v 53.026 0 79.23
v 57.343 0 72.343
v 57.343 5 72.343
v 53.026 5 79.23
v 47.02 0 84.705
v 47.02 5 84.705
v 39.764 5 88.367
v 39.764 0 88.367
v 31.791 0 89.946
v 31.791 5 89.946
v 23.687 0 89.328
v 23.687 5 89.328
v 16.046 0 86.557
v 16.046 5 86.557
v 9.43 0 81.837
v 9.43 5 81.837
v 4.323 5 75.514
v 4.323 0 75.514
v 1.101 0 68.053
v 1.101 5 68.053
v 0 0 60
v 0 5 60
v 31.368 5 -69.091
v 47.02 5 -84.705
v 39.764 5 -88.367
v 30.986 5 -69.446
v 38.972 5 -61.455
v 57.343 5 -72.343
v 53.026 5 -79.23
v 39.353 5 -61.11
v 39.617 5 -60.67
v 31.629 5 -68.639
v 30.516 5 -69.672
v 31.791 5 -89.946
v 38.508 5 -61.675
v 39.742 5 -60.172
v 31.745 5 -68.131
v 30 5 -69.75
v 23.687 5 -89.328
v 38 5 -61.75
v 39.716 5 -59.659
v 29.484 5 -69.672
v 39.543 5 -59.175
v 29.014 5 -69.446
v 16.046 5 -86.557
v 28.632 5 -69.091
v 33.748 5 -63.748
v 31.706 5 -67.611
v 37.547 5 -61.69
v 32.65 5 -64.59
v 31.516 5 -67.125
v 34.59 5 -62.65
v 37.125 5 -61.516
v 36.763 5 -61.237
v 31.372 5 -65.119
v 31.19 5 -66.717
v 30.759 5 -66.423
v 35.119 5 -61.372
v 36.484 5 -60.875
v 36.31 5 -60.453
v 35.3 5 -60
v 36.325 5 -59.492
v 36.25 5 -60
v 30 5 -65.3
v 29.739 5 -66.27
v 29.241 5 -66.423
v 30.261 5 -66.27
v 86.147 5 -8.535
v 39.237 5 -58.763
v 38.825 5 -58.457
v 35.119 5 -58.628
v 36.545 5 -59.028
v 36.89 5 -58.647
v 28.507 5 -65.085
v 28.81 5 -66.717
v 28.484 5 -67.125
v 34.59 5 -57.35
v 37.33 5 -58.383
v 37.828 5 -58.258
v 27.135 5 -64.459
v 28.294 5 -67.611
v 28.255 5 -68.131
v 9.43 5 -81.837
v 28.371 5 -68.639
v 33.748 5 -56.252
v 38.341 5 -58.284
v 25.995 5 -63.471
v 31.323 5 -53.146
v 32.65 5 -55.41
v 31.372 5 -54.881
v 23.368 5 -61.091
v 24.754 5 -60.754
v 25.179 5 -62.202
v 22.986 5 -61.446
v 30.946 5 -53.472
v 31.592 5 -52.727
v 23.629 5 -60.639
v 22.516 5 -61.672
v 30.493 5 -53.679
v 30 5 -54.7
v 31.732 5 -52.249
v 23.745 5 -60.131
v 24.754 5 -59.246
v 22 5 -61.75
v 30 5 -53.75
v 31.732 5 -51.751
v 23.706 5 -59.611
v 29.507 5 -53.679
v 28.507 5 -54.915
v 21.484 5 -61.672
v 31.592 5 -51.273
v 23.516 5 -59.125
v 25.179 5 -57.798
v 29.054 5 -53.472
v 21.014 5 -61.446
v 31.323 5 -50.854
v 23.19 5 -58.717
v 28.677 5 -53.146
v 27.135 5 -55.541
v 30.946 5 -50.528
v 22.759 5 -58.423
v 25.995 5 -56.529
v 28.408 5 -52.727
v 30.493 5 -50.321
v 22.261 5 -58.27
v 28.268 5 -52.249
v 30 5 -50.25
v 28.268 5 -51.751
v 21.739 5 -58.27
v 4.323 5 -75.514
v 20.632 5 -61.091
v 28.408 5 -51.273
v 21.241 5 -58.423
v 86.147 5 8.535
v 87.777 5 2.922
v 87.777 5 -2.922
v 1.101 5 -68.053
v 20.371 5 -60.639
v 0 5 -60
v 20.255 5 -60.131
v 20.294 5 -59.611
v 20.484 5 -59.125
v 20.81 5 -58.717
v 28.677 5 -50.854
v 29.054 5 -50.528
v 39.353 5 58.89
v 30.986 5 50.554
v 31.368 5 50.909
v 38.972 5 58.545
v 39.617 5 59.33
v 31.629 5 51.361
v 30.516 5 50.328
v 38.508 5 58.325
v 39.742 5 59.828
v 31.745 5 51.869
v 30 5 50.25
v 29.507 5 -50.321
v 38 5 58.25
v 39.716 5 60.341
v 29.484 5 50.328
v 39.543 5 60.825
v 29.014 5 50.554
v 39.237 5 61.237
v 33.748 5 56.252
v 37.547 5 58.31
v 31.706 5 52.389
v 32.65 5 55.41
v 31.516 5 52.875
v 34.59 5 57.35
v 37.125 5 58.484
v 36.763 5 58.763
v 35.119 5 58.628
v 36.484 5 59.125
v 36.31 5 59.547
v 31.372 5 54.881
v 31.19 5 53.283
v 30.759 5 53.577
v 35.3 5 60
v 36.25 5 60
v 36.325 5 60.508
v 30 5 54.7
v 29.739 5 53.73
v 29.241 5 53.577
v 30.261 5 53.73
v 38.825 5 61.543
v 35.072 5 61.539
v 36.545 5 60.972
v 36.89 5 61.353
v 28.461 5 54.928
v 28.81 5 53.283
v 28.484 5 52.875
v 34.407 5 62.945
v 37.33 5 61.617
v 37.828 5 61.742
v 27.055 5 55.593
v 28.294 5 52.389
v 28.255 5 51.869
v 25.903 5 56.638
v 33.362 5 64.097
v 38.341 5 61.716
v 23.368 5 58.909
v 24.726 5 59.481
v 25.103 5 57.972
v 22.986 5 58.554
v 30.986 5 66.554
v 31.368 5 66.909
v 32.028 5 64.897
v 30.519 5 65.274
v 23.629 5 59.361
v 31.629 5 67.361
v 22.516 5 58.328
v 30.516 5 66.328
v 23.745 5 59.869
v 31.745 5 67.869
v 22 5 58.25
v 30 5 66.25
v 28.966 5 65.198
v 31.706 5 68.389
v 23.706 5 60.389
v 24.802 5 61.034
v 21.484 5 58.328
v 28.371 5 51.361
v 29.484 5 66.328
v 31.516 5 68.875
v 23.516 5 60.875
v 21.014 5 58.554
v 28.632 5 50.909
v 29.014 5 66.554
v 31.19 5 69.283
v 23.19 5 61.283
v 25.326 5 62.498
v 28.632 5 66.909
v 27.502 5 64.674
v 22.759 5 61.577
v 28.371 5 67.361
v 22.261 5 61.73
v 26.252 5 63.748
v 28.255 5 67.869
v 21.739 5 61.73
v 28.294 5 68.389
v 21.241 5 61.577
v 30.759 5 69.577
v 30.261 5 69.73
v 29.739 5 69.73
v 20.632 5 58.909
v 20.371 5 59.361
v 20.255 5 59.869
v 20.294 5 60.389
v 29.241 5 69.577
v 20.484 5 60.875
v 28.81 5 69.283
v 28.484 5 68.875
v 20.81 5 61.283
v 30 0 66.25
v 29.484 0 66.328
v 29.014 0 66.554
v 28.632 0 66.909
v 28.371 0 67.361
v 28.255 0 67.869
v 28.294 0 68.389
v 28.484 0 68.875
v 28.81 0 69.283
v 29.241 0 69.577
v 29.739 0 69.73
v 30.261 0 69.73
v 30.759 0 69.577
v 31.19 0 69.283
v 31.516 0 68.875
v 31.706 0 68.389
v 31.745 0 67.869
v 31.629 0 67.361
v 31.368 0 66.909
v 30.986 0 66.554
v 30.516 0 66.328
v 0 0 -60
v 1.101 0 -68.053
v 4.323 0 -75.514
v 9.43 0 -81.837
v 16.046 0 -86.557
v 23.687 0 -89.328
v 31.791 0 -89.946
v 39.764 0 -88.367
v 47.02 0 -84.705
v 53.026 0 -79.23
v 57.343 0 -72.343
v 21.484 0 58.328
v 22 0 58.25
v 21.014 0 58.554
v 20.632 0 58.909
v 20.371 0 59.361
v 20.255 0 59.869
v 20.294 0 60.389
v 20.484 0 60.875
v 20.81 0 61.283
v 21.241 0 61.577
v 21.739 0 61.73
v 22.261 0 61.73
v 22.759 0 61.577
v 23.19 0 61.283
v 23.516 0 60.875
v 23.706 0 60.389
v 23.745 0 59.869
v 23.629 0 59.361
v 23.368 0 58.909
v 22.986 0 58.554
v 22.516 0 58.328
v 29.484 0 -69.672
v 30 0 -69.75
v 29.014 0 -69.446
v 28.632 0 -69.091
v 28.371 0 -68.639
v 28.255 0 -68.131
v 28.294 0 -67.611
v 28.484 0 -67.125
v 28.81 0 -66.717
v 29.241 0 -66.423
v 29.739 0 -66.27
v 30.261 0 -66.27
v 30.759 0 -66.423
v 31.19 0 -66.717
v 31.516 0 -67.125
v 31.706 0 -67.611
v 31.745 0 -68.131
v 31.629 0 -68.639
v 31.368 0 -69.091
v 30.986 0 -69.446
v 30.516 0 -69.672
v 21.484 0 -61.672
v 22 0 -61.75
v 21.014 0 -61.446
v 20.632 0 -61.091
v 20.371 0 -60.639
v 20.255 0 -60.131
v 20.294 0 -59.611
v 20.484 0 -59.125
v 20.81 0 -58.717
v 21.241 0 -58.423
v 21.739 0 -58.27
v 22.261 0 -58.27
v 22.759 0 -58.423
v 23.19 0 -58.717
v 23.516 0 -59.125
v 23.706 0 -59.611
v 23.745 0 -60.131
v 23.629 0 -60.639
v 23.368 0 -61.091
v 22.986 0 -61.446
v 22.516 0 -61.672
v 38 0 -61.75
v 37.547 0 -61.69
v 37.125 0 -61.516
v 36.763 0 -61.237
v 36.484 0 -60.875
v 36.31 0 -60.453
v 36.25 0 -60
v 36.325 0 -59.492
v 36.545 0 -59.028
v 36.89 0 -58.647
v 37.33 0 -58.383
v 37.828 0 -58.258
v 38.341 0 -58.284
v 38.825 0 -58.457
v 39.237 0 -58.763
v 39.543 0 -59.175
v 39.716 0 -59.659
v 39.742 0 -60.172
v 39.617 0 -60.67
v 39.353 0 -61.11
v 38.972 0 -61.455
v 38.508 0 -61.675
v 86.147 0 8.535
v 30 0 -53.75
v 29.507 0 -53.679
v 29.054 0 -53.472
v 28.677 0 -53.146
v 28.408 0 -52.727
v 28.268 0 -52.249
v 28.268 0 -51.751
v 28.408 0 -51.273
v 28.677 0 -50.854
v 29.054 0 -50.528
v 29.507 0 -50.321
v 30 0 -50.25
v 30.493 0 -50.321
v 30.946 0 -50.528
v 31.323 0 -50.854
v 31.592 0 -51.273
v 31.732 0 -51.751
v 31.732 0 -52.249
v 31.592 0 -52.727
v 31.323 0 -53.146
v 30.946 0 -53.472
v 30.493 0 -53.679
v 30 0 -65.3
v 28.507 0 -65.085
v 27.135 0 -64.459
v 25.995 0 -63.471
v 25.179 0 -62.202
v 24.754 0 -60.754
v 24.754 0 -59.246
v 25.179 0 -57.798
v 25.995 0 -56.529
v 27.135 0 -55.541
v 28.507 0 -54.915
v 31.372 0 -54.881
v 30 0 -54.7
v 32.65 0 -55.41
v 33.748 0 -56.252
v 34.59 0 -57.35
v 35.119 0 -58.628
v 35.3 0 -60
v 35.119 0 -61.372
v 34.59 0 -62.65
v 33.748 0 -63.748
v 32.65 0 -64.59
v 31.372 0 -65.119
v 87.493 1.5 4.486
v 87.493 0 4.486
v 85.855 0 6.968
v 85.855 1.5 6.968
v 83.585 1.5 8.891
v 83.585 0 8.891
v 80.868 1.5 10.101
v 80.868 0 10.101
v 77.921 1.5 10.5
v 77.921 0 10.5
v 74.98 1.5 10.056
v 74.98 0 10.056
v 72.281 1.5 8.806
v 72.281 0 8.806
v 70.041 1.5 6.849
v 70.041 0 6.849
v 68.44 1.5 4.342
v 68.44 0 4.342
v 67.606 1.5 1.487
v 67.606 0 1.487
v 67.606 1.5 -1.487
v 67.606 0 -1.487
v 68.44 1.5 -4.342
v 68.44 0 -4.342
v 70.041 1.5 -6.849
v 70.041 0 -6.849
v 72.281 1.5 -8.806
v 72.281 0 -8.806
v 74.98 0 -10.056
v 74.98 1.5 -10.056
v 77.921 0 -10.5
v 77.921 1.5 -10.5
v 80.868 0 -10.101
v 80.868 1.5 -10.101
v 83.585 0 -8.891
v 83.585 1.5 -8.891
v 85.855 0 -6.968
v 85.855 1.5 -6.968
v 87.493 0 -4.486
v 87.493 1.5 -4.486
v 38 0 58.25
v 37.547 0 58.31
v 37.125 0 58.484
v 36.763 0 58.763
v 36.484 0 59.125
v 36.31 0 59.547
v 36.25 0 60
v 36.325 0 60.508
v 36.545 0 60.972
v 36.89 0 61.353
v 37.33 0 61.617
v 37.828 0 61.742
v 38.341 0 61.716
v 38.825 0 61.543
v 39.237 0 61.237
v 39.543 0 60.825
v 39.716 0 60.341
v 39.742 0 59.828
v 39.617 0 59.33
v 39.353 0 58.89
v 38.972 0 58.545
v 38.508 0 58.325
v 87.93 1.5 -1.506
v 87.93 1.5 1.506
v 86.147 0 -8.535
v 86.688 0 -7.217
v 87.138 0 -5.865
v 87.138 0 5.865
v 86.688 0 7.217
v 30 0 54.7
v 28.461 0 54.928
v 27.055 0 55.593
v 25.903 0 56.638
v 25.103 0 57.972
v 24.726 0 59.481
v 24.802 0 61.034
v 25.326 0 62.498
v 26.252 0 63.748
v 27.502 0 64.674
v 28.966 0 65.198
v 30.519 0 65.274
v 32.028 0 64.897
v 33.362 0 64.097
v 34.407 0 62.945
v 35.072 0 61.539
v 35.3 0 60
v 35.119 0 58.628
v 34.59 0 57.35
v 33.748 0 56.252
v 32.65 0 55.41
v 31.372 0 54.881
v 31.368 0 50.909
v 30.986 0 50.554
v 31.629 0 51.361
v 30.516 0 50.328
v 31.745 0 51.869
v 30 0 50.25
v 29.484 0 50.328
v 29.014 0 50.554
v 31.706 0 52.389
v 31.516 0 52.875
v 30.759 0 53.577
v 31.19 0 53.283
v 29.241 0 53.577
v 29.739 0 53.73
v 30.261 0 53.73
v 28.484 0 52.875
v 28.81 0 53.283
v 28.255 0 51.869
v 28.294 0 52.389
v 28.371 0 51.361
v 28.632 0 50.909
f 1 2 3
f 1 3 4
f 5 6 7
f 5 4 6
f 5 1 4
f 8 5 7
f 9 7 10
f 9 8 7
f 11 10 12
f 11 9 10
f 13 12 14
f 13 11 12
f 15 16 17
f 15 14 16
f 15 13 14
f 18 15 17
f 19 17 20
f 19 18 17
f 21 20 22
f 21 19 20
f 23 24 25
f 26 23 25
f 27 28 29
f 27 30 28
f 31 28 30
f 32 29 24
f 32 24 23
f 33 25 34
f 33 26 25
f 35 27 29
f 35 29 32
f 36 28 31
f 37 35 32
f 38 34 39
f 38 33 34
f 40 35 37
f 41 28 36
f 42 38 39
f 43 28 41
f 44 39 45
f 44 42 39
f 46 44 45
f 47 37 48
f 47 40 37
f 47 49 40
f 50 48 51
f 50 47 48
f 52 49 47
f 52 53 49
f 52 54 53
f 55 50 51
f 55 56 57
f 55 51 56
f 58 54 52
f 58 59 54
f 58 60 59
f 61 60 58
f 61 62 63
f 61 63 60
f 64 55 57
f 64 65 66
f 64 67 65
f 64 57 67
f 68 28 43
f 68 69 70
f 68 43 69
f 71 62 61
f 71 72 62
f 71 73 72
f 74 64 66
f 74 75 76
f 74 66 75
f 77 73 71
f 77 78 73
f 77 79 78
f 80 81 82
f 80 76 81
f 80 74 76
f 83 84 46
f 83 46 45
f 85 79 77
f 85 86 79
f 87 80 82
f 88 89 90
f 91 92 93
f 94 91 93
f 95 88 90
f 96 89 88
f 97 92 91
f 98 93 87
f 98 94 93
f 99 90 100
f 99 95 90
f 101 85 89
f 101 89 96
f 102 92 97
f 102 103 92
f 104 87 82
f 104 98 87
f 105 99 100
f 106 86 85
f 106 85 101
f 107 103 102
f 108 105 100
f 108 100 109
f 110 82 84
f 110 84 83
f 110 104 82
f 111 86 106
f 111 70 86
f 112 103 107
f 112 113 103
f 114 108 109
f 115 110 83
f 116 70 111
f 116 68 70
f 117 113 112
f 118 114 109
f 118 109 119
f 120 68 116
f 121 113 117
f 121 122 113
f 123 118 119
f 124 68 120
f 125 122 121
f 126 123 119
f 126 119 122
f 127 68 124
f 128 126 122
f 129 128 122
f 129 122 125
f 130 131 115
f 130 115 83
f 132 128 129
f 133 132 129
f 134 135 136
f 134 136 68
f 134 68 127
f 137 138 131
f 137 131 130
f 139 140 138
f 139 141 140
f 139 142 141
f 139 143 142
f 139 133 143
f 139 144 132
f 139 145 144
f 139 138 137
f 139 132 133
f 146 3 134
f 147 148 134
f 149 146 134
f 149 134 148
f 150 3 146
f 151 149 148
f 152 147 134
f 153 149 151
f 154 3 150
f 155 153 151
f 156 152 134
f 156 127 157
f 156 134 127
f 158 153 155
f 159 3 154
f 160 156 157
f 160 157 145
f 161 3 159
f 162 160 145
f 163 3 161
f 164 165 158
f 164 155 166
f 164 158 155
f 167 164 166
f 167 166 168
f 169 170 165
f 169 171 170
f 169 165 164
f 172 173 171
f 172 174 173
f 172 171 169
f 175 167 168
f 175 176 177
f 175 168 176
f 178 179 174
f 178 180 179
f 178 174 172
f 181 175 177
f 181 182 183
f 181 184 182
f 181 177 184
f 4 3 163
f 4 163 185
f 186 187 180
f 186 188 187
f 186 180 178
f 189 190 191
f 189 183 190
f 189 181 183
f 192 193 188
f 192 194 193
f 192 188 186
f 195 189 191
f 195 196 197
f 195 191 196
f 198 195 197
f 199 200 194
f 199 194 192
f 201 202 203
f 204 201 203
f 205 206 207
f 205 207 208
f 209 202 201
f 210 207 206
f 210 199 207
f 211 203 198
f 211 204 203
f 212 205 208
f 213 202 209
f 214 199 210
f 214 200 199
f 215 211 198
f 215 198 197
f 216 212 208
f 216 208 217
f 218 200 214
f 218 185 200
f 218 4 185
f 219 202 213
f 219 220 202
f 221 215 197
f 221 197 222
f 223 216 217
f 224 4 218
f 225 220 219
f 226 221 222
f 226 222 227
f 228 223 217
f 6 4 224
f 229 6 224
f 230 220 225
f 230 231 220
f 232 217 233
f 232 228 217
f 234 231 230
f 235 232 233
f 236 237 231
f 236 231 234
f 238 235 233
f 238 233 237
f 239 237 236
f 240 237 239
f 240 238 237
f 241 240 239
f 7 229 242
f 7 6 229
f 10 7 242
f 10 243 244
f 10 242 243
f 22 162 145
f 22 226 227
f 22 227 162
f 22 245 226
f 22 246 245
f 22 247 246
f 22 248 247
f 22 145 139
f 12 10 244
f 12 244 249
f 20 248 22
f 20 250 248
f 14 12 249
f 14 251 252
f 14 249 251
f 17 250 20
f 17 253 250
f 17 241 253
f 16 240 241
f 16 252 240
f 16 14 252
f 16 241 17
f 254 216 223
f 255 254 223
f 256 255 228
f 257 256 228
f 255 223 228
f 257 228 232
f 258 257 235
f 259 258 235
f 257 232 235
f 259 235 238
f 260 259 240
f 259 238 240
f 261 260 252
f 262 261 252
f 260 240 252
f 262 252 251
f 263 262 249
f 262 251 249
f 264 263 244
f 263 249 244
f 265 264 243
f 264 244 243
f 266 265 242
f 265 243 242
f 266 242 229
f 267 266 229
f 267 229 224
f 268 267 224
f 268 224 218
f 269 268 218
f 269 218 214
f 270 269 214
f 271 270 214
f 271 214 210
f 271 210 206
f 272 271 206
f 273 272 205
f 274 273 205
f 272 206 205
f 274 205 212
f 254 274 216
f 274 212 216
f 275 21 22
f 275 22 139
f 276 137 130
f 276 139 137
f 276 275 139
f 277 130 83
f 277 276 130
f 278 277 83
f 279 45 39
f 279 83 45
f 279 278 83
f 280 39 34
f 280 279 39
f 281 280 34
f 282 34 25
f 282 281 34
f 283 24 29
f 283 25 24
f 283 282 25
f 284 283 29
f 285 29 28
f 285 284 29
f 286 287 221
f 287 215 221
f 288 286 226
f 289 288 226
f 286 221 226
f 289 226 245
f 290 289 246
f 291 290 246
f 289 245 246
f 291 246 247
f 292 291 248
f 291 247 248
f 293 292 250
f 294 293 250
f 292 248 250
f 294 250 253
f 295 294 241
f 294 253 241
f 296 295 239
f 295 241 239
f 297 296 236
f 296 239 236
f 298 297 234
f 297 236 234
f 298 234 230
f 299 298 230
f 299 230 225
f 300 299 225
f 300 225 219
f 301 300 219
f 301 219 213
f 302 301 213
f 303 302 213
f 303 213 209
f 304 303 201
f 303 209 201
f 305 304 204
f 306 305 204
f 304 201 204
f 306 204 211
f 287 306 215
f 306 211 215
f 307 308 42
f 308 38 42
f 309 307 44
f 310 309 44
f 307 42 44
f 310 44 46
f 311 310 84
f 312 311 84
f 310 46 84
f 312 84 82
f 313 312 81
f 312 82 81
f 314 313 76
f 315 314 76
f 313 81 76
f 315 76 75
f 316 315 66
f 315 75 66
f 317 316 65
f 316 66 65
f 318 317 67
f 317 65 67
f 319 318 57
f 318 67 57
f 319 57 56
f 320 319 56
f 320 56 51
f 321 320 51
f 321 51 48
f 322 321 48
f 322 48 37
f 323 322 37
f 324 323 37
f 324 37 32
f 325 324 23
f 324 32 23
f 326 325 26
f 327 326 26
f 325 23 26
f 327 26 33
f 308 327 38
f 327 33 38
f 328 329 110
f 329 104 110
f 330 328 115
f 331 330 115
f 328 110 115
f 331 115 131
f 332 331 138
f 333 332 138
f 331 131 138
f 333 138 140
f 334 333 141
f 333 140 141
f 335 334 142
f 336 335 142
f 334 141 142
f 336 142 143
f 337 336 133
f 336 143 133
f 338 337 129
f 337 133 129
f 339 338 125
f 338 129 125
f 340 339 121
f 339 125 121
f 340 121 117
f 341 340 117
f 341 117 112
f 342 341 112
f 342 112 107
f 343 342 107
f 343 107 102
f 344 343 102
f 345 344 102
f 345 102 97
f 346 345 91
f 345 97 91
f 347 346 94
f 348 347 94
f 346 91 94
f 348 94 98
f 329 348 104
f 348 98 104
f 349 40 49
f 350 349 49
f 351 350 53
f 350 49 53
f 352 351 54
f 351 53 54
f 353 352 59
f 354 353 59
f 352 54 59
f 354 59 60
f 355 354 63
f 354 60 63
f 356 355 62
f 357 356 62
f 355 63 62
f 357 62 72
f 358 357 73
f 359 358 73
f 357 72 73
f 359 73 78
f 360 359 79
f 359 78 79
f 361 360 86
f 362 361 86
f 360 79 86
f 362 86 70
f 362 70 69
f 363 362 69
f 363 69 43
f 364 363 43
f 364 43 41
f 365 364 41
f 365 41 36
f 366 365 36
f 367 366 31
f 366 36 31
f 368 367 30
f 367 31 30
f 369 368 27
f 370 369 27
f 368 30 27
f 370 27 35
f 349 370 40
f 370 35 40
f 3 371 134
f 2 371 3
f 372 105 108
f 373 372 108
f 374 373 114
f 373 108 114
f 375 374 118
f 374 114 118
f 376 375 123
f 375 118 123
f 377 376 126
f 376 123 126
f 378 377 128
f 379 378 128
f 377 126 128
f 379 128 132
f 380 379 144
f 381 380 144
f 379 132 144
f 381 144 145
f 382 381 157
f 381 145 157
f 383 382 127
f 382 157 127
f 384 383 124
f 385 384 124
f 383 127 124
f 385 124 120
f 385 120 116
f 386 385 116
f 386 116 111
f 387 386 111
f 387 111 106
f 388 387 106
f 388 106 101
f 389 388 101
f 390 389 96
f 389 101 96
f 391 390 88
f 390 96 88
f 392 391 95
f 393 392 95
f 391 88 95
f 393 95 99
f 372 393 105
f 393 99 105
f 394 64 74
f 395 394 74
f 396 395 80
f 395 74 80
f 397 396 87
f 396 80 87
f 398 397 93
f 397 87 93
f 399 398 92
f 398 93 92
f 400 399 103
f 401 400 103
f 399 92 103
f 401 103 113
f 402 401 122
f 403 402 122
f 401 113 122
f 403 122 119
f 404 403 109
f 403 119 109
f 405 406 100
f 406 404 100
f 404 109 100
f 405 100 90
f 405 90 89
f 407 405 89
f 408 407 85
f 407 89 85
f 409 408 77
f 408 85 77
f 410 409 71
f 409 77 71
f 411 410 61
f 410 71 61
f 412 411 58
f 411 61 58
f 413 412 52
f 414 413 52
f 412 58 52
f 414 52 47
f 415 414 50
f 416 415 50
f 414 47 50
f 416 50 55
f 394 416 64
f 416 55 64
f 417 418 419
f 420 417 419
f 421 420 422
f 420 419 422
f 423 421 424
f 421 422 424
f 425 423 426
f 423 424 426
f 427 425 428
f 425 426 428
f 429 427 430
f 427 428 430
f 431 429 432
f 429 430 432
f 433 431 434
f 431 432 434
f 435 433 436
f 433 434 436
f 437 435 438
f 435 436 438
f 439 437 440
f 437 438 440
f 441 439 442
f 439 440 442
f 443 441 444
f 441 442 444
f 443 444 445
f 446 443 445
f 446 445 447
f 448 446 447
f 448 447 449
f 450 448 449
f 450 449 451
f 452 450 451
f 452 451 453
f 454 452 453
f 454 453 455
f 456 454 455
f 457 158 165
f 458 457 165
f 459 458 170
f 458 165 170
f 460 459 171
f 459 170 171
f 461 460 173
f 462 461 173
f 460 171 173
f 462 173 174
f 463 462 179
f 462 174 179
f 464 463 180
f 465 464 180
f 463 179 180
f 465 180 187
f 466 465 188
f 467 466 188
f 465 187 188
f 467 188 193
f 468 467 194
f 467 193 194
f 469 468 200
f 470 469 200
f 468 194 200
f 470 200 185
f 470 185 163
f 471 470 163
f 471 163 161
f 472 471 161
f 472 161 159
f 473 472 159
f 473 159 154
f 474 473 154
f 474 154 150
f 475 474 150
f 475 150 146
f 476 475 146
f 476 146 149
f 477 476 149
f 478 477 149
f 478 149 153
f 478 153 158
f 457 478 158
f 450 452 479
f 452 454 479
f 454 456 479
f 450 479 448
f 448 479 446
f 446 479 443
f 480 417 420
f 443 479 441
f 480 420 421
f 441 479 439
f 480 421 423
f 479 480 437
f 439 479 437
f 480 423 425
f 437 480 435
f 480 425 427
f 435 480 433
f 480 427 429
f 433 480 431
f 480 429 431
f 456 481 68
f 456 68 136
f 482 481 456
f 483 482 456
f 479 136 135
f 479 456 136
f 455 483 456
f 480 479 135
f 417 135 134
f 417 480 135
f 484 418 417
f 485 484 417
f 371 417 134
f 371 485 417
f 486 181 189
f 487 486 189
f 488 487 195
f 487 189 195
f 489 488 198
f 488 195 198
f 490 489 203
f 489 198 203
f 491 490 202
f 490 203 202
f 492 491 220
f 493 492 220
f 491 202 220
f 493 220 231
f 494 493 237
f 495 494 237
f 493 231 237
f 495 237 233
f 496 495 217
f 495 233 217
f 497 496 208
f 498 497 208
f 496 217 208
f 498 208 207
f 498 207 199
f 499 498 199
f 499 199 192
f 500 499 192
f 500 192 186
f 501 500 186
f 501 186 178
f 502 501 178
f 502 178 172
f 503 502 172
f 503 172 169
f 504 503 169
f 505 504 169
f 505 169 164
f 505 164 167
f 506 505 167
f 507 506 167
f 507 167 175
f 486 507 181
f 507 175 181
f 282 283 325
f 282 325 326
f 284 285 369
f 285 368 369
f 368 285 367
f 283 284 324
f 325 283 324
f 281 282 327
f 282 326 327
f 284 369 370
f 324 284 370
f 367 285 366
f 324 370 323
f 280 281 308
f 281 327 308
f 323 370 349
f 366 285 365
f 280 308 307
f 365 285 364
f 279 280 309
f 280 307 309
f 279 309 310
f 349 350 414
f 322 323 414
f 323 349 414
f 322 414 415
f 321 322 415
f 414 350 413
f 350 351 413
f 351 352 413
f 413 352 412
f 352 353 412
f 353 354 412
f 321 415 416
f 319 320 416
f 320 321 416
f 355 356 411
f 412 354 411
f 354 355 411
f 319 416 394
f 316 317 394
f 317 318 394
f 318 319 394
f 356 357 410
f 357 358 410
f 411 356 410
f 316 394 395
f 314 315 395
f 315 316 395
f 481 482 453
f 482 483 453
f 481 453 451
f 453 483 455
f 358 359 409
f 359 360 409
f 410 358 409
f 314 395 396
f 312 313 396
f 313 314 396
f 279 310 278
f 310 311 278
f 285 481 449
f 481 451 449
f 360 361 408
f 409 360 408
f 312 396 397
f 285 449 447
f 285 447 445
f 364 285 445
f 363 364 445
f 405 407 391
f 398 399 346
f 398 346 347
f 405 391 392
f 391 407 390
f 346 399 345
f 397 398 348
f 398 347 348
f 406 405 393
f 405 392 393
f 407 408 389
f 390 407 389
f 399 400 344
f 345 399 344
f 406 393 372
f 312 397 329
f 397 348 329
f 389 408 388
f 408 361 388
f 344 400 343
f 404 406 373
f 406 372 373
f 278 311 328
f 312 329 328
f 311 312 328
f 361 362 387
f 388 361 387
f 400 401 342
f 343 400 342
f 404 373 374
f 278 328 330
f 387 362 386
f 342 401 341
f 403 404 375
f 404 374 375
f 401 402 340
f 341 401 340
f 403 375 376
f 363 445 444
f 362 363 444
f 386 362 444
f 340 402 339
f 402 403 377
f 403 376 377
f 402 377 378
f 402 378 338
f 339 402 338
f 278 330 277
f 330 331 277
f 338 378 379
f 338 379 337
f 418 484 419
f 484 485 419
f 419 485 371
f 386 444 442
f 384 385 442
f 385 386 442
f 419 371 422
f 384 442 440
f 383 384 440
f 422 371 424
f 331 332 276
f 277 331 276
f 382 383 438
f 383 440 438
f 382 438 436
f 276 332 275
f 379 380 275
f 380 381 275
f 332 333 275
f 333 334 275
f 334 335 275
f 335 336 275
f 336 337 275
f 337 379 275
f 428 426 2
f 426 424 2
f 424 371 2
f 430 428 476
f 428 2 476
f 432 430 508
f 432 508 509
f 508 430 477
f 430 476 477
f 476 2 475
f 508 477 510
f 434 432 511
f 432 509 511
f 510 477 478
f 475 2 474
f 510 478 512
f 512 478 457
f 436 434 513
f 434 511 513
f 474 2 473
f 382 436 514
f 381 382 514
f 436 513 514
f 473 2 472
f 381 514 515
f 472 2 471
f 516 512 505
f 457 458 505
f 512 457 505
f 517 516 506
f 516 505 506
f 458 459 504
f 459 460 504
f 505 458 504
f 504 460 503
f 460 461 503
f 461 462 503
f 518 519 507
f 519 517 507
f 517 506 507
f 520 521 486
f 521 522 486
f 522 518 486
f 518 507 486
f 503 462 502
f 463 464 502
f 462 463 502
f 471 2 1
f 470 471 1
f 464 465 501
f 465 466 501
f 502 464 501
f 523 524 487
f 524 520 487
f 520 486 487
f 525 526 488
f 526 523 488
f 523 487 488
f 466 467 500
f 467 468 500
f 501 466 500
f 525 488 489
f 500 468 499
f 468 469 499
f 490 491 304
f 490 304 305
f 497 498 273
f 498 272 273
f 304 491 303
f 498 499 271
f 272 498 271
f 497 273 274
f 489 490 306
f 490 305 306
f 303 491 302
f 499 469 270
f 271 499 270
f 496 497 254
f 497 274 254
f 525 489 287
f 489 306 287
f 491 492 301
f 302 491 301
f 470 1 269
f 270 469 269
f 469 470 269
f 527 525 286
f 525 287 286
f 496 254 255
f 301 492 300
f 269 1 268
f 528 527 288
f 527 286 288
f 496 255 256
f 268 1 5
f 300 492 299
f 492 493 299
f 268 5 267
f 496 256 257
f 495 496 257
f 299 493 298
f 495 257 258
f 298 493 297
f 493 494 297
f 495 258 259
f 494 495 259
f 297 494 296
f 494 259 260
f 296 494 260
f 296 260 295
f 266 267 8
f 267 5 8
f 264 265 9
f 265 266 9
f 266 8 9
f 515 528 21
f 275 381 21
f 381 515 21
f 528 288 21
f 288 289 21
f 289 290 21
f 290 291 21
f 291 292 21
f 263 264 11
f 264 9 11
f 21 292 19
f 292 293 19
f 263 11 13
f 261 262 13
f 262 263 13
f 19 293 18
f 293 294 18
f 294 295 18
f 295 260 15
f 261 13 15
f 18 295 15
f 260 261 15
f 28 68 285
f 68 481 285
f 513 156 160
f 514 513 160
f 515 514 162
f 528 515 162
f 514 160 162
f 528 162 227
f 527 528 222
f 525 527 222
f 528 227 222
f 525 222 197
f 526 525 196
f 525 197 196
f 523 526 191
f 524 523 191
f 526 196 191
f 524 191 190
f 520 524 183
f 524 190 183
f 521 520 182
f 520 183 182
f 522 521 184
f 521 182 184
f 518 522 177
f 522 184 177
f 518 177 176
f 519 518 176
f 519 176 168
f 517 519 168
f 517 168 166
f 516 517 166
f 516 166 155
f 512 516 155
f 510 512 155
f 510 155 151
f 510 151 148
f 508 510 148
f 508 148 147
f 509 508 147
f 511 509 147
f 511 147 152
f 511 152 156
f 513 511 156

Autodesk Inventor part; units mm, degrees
ref_plane "YZ Plane" through (0, 0, 0) normal (1, 0, 0) x (0, 1, 0)
ref_plane "XZ Plane" through (0, 0, 0) normal (0, 1, 0) x (-1, 0, 0)
ref_plane "XY Plane" through (0, 0, 0) normal (0, 0, 1) x (1, 0, 0)
sketch "Sketch1" plane through (0, 0, 0) normal (0, 1, 0) x (-1, 0, 0)
  line L0 (0, 60) -> (0, -60)
  line L1 (0, 0) -> (-60, 0)
  line L2 (-60, 60) -> (-60, -60)
  line L3 (0, 60) -> (-30, 60)
  line L4 (-30, 60) -> (-30, -60)
  arc A0 (0, 60) -> (-60, 60) centre (-30, 60) ccw
  arc A1 (-60, -60) -> (0, -60) centre (-30, -60) ccw
  circle A2 centre (-78, 0) radius 10.5
  line L5 (-30, 60) -> (-38, 60)
  circle A3 centre (-38, 60) radius 1.75
  circle A4 centre (-30, 52) radius 1.75
  circle A5 centre (-22, 60) radius 1.75
  circle A6 centre (-30, 68) radius 1.75
  line L6 (-30, -60) -> (-38, -60)
  circle A7 centre (-38, -60) radius 1.75
  circle A8 centre (-30, -52) radius 1.75
  circle A9 centre (-22, -60) radius 1.75
  circle A10 centre (-30, -68) radius 1.75
  line L7 (-60, 0) -> (-90, 0)
  line L8 (-90, 0) -> (-57.3431, 72.3431)
  line L9 (-90, 0) -> (-57.3431, -72.3431)
  arc A11 (-86.1472, 8.5348) -> (-86.1472, -8.5348) centre (-67.2404, 0) ccw
  line L10 (-90, 0) -> (-78, 0)
  line L11 (-78, 10.5) -> (-85.2601, 10.5)
  line L12 (-78, -10.5) -> (-85.2601, -10.5)
  point P0 (-87.4935, -4.4859)
  point P1 (-87.4935, 4.4859)
  dimension "d0" = 120
  dimension "d1" = 60
  dimension "d2" = 120
  dimension "d5" = 21
  dimension "d15" = 8
  dimension "d16" = 3.5
  dimension "d19" = 360
  dimension "d28" = 30
  dimension "d29" = 12
extrude "Extrusion1" add sketch "Sketch1" along normal blind 5 contours L0 L1 L4 A4 L3 A5 | A3 | L3 A5 L4 A4 L1 L2 A0 | A7 | A8 L4 | L4 A8 | L0 A1 L2 L1 | A5 L3 | L3 A5 | A0 L2 L7 A2 L11 L8 | L11 A2 A11 L8 | L9 L12 A2 L7 L2 A1 | A4 L4 | L4 A4 | A2 L7 A11 | L9 A11 A2 L12 | A2 A11 L7 | A6 | A9 | A10 picked at (-84.0044, 3.1674) picked at (-84.0044, -3.1674)
hole "Hole1" at (30, 0, 60) at (30, 0, -60) direction (0, 1, 0) diameter 10.6 end through all
extrude "Extrusion2" cut sketch "Sketch1" along normal blind 1.5 contours A2 L7 A11 | A2 A11 L7 picked at (-84.0044, 3.1674) picked at (-84.0044, -3.1674)
hole "Hole2" at (38, 0, 60) at (30, 0, 68) at (22, 0, 60) at (30, 0, 52) at (38, 0, -60) at (30, 0, -52) at (30, 0, -68) at (22, 0, -60) direction (0, 1, 0) diameter 3.5 end through all
properties part number "SyringePushMount"
